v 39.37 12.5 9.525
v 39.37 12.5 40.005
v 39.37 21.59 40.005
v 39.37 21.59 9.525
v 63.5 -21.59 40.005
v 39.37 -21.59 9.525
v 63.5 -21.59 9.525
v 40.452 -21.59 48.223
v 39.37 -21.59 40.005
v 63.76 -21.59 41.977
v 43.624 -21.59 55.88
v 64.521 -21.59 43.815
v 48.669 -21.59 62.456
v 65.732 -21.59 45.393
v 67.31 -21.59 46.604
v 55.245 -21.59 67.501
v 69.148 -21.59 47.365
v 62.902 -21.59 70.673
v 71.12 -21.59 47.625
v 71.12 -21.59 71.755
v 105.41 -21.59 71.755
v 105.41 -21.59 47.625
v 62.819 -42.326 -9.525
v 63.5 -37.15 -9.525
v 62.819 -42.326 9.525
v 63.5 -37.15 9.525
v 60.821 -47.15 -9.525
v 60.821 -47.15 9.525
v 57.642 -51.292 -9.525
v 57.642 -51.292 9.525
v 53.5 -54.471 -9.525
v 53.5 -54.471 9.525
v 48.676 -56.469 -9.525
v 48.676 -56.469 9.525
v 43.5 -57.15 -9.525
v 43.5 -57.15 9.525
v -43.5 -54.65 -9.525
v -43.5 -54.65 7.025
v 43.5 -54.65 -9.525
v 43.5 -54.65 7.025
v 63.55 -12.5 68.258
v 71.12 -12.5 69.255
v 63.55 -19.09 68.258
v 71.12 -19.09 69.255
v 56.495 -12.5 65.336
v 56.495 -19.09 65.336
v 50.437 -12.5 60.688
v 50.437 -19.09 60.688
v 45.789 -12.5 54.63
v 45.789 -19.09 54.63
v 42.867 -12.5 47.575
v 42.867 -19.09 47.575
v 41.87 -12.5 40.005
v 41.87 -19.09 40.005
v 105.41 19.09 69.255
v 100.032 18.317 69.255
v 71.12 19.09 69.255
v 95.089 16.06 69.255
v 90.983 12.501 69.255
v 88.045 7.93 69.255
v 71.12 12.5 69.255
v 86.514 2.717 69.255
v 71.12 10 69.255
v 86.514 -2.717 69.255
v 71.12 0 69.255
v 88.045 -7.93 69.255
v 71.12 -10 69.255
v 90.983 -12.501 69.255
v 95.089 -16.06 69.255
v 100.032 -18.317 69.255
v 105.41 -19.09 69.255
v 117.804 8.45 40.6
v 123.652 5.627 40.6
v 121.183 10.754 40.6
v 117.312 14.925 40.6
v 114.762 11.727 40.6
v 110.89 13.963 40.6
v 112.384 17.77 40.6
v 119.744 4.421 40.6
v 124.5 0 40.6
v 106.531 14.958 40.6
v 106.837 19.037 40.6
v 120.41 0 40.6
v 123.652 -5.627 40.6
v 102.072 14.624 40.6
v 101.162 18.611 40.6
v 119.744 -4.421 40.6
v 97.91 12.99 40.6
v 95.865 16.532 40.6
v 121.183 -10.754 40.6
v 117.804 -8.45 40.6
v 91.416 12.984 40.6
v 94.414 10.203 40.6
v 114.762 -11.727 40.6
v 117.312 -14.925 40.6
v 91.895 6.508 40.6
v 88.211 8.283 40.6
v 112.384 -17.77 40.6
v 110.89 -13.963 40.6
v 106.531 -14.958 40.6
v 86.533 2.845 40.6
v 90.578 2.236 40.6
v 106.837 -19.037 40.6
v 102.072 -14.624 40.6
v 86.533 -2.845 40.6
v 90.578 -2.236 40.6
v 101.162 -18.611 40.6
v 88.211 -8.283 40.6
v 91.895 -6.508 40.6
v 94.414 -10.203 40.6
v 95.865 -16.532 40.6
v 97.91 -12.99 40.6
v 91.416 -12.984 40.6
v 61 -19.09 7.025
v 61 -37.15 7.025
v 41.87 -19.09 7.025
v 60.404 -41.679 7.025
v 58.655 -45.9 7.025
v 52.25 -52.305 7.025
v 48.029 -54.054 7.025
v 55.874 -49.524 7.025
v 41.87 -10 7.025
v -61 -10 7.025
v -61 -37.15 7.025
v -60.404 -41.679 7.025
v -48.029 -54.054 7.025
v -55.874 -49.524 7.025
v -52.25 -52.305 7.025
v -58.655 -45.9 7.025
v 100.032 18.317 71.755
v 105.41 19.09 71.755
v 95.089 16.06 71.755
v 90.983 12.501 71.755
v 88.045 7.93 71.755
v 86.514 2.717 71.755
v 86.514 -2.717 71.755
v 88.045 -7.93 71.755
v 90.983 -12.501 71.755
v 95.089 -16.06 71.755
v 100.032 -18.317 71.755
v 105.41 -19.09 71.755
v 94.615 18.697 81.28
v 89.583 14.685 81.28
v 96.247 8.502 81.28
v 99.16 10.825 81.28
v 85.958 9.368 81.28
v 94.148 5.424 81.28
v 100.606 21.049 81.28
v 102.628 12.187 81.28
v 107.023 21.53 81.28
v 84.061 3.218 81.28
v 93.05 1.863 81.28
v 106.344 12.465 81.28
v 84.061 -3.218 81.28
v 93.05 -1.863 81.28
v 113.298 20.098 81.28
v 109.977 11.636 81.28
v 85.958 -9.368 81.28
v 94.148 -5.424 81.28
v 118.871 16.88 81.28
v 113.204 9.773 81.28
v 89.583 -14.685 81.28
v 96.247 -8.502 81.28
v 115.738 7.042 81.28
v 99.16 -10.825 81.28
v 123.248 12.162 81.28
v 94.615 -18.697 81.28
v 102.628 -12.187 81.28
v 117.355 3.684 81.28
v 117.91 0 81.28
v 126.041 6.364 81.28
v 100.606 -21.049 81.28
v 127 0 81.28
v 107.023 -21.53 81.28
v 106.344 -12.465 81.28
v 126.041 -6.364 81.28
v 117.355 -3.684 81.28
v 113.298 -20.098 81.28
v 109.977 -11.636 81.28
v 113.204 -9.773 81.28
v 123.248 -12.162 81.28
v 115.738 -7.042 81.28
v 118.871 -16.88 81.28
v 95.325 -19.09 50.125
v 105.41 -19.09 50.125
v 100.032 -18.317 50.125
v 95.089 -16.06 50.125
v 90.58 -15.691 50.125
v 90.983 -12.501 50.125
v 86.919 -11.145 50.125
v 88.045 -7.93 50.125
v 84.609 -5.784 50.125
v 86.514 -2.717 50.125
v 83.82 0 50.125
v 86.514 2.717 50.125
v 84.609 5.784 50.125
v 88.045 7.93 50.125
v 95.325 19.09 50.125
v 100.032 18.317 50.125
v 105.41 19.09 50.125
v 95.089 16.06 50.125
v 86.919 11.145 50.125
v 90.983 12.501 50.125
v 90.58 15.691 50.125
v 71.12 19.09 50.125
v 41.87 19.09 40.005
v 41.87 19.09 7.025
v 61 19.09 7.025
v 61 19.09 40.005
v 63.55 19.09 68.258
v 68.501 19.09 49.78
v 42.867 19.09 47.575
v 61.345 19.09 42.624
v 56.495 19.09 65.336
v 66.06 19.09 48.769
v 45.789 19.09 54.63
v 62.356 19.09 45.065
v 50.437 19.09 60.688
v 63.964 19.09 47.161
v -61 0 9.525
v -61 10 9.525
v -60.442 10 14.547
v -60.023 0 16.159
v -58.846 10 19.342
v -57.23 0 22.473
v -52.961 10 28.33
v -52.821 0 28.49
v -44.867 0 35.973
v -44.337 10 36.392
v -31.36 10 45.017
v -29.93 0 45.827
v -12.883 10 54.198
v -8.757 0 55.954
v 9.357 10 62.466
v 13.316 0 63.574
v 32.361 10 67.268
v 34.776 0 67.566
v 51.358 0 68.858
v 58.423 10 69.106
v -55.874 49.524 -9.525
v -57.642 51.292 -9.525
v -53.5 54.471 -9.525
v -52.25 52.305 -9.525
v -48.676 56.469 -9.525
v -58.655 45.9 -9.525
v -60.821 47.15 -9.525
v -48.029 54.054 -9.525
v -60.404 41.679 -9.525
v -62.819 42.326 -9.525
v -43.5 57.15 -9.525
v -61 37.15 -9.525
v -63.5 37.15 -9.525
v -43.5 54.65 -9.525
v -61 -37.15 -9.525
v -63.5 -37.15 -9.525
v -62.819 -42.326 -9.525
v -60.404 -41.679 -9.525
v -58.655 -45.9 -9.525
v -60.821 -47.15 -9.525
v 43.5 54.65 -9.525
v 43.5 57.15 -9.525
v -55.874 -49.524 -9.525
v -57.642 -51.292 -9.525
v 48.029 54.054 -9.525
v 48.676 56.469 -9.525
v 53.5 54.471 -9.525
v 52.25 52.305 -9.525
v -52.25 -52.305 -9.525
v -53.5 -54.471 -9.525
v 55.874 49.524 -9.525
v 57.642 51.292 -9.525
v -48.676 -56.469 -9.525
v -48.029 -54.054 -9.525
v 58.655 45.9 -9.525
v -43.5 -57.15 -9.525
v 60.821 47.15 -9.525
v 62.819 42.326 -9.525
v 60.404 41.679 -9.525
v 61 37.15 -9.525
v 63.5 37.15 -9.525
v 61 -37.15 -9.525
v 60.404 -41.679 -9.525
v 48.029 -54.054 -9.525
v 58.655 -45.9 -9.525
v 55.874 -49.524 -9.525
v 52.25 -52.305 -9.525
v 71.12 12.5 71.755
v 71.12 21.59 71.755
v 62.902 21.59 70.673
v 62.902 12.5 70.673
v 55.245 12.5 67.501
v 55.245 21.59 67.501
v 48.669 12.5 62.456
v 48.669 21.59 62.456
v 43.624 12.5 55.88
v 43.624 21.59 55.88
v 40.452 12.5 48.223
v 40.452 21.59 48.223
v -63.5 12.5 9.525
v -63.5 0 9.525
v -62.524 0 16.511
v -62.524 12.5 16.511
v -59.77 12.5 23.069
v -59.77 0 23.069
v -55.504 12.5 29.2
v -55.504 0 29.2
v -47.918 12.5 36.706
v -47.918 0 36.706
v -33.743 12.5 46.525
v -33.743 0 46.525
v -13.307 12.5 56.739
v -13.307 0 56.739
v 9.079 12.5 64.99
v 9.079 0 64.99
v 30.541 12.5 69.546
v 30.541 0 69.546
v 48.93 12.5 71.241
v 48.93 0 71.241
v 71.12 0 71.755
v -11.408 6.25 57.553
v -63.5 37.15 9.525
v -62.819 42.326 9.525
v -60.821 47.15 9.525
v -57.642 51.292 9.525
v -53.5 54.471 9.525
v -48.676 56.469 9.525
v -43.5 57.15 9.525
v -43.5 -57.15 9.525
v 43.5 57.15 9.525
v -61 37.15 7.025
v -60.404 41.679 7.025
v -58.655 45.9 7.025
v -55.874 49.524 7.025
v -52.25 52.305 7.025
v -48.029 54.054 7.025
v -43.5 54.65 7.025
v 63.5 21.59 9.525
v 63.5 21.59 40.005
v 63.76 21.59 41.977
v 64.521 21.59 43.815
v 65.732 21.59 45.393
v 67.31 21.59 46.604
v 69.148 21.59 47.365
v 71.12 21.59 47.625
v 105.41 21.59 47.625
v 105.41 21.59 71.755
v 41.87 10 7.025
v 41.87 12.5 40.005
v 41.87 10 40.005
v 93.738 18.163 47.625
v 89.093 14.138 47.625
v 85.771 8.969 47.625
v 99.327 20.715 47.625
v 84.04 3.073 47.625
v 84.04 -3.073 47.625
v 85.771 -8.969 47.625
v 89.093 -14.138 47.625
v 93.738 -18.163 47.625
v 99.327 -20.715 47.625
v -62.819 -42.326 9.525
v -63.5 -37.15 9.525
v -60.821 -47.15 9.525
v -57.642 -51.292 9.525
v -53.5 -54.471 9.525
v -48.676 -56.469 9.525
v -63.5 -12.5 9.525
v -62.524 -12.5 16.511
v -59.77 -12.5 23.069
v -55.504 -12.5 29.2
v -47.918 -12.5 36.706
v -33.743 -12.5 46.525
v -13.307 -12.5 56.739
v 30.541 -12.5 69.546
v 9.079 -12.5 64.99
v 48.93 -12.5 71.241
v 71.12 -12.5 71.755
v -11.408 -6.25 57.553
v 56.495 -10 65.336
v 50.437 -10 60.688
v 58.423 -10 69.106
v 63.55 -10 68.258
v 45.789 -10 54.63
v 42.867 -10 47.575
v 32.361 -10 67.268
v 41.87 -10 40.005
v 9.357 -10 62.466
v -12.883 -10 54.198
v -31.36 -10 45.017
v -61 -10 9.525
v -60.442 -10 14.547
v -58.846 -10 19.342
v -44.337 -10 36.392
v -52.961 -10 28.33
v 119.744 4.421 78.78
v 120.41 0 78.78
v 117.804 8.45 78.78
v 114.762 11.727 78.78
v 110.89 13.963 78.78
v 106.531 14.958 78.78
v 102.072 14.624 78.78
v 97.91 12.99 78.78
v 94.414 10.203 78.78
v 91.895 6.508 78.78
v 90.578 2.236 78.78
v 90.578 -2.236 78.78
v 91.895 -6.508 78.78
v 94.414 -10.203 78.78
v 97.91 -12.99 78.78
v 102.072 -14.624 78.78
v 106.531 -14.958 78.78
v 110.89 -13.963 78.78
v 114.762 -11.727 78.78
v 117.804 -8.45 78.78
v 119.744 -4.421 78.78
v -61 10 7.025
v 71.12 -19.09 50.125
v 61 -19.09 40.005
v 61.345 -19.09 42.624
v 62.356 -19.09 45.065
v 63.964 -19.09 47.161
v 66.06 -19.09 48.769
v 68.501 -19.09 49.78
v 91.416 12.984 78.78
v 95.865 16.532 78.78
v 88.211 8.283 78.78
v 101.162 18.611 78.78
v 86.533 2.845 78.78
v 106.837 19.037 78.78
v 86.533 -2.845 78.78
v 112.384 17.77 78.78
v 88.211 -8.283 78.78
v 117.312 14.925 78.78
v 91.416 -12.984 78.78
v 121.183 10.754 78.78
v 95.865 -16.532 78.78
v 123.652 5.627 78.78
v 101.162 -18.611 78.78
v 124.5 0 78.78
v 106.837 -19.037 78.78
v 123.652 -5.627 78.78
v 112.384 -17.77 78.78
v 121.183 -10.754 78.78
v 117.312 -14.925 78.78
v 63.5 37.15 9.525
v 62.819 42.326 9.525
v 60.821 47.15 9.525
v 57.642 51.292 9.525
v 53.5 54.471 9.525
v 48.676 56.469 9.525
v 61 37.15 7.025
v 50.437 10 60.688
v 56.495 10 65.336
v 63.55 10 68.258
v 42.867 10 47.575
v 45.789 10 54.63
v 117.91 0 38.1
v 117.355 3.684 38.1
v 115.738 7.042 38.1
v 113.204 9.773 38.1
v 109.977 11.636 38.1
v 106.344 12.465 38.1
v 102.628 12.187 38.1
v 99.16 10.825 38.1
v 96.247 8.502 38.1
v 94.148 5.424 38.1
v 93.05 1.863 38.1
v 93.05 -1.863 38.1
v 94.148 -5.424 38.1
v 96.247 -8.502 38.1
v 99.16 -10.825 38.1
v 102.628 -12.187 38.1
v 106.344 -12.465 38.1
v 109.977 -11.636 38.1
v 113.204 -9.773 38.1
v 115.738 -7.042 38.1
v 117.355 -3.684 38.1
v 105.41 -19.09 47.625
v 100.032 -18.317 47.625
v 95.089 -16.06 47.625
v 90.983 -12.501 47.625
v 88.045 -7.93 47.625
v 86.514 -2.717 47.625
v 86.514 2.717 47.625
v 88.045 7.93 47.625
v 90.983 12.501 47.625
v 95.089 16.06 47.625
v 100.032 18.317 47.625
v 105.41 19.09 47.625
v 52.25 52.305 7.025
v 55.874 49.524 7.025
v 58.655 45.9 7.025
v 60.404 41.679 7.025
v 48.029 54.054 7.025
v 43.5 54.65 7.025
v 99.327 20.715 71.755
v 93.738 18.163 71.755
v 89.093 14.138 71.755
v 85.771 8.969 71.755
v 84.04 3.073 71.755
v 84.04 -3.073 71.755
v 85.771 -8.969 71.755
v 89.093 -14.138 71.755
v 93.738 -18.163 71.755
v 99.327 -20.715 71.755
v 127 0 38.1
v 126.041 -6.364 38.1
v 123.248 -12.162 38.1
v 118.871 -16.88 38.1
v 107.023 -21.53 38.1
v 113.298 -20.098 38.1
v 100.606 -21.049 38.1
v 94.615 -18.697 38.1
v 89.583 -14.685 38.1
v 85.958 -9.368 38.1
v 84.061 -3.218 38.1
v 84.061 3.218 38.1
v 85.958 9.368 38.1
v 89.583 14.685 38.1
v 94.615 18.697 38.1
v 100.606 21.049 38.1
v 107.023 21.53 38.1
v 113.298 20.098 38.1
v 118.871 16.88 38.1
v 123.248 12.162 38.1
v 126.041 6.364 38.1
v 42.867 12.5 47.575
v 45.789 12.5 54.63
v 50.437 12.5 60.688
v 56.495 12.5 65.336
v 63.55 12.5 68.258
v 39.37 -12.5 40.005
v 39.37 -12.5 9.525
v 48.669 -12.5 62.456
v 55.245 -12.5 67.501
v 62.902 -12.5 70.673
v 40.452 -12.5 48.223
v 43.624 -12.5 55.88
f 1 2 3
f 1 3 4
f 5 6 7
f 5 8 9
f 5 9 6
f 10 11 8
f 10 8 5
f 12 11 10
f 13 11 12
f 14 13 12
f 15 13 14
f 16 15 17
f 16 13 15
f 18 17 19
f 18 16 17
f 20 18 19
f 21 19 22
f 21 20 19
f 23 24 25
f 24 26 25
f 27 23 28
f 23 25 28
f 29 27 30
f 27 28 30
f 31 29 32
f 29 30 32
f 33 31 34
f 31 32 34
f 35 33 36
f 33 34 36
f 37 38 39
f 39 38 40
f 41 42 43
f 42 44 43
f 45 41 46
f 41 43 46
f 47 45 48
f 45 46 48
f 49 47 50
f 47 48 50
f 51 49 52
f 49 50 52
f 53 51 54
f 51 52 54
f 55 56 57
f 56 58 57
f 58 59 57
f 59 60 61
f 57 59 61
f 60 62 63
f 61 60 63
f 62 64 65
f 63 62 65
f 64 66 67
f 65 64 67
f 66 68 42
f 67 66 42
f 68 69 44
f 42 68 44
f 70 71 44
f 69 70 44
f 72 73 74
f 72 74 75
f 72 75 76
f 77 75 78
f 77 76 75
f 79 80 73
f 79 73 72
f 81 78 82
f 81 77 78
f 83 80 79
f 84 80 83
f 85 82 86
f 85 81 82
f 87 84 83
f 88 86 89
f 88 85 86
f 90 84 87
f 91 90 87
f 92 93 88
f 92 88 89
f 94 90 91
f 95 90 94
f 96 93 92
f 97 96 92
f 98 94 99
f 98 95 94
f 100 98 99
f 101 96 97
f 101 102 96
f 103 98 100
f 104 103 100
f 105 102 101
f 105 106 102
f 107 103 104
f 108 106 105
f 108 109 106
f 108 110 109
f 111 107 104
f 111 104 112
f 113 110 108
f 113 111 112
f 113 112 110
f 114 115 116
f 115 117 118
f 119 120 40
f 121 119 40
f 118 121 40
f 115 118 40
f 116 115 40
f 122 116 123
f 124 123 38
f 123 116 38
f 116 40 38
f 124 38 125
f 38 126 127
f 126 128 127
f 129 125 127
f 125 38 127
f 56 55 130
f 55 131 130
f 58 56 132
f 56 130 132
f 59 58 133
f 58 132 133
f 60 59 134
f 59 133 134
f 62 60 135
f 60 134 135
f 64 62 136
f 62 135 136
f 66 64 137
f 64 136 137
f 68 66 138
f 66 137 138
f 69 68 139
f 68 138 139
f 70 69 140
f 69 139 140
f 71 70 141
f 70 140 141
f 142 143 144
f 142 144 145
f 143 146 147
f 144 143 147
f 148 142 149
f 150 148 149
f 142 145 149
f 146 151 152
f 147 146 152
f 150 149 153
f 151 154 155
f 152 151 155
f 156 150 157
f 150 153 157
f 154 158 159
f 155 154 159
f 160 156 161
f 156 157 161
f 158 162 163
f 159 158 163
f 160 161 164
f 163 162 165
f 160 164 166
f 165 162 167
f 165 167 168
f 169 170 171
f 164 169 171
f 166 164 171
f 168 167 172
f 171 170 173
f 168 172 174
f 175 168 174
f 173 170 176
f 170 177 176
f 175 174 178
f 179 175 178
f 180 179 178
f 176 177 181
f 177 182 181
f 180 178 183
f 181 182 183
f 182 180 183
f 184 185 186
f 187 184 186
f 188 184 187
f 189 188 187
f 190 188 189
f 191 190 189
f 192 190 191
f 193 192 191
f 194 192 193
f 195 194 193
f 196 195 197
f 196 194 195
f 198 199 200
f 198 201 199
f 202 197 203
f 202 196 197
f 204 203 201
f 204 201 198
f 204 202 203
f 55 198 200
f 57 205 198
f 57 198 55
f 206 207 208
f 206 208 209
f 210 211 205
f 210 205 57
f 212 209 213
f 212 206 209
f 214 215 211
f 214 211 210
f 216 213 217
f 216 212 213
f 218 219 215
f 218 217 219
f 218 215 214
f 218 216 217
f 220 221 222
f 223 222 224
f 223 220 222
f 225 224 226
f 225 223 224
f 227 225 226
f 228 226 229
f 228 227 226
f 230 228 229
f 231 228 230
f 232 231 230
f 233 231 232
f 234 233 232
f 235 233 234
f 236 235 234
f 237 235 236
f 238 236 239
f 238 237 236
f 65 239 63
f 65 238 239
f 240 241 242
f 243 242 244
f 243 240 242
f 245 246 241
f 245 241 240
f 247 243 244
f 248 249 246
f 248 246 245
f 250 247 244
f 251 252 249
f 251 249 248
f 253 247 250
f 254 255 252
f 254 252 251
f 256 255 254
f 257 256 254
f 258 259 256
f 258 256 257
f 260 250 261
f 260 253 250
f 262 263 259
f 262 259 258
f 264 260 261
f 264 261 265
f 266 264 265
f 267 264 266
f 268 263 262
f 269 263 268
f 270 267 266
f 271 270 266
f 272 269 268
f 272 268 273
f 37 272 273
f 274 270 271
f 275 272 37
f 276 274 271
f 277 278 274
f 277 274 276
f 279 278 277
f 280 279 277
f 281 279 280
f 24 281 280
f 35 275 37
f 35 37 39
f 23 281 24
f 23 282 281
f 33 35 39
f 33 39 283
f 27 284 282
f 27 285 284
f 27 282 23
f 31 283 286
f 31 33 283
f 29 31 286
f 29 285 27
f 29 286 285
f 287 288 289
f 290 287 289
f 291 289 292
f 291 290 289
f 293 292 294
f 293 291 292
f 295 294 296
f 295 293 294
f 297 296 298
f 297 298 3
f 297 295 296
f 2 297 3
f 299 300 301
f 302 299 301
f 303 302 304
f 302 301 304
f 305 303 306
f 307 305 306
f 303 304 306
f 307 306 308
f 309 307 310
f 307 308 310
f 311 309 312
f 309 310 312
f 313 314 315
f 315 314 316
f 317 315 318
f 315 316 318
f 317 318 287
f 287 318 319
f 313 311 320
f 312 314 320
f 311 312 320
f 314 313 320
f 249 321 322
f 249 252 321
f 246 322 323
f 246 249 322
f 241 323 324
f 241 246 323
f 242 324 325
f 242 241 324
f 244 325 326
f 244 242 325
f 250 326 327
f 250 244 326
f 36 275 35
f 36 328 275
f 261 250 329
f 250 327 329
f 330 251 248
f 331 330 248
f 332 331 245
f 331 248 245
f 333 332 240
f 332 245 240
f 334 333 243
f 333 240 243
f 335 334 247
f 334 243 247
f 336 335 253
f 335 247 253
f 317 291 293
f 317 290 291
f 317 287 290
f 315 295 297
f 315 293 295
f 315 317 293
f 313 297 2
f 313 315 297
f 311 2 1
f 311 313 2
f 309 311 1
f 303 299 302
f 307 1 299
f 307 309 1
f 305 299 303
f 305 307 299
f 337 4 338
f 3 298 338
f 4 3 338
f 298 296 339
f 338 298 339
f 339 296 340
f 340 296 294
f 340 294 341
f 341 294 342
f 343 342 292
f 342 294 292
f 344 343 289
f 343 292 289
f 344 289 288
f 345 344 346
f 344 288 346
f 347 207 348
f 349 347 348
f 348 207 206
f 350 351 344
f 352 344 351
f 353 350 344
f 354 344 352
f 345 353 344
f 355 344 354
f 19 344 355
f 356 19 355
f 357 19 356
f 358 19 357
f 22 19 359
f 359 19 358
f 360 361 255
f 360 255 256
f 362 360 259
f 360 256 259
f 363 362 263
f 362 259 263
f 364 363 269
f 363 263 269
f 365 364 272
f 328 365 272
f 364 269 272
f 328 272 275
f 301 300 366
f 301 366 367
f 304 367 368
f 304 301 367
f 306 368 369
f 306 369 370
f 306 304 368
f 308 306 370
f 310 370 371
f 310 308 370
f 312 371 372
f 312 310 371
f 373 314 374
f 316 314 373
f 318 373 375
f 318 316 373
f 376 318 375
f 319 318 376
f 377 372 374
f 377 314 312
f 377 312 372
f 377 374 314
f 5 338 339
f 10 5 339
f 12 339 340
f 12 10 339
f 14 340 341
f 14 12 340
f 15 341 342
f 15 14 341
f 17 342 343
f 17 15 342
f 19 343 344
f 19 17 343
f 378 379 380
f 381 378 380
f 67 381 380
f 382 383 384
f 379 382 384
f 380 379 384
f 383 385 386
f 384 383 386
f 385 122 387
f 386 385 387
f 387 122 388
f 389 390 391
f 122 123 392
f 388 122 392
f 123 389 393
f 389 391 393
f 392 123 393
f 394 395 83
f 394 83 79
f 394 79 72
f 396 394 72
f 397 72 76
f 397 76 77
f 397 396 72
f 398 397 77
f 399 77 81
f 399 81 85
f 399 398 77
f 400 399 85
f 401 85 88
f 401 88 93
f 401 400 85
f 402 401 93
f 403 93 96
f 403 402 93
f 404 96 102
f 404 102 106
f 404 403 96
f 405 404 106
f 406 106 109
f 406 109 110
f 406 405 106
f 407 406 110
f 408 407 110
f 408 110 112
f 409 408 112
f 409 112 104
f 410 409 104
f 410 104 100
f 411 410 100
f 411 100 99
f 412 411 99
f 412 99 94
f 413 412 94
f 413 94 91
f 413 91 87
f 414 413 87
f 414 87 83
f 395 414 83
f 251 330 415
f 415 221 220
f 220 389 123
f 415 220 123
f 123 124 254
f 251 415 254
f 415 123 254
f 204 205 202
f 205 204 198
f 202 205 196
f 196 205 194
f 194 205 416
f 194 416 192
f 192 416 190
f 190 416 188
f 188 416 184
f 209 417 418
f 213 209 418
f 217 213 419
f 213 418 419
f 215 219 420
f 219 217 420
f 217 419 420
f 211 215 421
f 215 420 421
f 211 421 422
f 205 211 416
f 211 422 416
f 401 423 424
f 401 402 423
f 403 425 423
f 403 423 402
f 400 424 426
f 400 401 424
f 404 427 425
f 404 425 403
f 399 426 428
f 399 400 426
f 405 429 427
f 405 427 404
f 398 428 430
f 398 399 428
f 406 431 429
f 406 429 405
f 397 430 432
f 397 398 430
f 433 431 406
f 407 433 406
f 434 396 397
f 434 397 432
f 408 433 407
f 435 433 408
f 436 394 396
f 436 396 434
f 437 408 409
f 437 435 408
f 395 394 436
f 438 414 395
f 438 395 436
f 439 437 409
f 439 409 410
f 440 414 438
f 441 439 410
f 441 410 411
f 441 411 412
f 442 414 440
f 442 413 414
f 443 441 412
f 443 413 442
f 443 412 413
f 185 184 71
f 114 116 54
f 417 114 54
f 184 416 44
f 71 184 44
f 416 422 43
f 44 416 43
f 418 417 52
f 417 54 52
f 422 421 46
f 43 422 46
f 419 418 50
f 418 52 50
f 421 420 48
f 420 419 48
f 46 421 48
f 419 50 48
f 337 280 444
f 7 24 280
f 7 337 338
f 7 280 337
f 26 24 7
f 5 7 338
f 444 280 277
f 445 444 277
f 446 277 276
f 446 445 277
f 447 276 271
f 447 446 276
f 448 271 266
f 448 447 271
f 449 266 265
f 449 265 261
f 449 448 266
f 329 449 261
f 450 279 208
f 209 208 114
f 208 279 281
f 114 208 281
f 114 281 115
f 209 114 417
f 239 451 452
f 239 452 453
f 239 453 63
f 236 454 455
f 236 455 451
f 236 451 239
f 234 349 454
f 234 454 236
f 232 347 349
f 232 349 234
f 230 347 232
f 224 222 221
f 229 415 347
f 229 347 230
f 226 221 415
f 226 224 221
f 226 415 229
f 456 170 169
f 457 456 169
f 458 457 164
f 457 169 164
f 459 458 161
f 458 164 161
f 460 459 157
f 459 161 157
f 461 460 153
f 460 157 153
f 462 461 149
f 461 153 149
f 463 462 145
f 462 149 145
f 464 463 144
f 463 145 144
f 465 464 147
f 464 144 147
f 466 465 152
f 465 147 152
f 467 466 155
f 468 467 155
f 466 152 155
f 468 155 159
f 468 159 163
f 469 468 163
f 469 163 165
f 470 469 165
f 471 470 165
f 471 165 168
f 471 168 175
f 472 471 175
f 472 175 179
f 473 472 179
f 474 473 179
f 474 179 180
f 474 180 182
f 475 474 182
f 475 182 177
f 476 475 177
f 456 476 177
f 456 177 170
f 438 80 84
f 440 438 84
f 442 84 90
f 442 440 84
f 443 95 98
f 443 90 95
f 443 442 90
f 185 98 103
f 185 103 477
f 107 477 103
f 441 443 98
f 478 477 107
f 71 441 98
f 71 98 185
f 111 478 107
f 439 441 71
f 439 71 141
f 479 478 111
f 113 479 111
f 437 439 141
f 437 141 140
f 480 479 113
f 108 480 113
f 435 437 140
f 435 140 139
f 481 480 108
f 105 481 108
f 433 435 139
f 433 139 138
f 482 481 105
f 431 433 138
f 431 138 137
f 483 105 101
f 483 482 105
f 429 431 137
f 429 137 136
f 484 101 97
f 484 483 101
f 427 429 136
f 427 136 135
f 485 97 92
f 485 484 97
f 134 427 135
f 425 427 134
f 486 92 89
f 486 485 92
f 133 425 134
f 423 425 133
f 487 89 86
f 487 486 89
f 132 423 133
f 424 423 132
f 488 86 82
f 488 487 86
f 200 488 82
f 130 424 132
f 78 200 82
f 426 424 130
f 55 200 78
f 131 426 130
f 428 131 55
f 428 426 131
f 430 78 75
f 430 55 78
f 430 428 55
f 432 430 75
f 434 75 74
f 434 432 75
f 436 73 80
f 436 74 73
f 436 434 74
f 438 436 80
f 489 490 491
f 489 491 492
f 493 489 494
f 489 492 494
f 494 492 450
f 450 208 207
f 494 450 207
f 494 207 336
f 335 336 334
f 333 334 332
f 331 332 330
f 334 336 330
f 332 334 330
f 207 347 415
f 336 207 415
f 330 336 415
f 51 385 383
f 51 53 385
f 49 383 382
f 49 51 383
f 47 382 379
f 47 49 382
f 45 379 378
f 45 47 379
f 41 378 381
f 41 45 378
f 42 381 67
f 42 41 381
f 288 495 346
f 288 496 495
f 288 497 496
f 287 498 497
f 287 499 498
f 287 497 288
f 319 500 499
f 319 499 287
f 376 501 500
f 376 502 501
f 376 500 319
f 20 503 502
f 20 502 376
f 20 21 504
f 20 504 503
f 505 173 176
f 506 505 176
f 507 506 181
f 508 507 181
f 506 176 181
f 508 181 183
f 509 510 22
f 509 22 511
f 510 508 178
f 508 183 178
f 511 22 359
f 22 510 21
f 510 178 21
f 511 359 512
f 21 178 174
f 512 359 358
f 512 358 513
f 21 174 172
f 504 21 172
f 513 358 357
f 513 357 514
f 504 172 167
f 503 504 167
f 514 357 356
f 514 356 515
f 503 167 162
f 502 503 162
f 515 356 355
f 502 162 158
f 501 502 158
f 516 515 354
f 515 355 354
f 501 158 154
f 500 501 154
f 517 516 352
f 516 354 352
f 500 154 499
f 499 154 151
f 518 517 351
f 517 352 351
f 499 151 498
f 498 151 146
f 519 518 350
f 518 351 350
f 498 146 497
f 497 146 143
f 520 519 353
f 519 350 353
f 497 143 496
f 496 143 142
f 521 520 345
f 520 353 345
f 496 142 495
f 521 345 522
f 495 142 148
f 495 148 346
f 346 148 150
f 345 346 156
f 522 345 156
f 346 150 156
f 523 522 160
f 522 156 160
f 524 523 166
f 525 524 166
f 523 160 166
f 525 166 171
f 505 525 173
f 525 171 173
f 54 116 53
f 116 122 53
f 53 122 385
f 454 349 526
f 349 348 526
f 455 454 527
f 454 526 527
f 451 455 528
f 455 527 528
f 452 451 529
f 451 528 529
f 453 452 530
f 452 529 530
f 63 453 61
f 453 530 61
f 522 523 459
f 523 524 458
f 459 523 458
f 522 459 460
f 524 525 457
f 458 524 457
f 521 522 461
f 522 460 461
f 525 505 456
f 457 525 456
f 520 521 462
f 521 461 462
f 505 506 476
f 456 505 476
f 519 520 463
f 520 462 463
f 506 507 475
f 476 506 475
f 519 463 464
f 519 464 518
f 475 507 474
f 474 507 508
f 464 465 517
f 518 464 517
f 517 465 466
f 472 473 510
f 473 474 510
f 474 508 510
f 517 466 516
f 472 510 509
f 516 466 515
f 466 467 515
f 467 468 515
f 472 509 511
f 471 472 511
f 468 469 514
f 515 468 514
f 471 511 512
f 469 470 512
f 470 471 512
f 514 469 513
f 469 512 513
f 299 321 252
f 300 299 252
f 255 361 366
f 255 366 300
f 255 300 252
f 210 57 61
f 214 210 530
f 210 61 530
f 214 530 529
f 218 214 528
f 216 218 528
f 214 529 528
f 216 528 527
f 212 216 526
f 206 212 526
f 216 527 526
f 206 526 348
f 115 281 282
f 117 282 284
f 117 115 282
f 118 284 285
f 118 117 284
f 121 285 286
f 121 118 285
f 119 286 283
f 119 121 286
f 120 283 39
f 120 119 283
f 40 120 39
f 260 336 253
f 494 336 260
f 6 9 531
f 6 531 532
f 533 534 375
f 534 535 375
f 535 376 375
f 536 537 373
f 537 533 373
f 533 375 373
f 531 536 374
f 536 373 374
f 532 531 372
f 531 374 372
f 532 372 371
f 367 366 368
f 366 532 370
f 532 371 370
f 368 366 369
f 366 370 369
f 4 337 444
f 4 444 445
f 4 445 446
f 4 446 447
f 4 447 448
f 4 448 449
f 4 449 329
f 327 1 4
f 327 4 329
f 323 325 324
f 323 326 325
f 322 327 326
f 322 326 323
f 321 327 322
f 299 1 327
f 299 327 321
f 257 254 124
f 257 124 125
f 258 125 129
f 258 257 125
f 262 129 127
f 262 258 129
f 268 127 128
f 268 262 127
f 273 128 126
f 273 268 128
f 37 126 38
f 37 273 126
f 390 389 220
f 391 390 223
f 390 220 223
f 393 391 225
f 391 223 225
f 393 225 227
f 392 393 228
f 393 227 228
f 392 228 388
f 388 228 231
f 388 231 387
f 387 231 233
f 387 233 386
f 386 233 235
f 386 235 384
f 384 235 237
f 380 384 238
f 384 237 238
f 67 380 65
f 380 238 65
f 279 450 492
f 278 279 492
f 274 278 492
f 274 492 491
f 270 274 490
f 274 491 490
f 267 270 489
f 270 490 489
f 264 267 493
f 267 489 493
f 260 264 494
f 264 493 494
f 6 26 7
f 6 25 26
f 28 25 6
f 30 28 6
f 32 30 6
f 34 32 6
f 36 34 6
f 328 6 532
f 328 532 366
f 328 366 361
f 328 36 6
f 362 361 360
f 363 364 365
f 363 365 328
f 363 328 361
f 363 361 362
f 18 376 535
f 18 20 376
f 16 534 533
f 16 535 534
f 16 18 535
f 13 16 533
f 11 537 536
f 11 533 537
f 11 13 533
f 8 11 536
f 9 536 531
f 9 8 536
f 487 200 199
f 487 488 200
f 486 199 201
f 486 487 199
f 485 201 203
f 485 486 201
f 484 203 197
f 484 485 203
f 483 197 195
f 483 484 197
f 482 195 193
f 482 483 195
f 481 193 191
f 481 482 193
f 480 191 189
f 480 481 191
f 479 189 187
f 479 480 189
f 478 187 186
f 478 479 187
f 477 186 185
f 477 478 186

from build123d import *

# Parameters (mm, degrees)
F1_DEPTH     = 57.15
F0_W         = 21.59
F0_H         = 24.13
F2_DEPTH     = 21.59
F3_DEPTH     = 12.5
F5_R         = 12.5
F6_DEPTH     = 90.806
F7_R         = 20
F8_T         = 2.5
F8_T3_DEPTH  = 107.87
F8_T5_DEPTH  = 14.09
F8_T7_DEPTH  = 29.13
F8_T9_DEPTH  = 14.09
F8_T11_DEPTH = 35.48
F8_T14_ANGLE = 90.000000001
F8_T16_ANGLE = 90.000000001
F8_T18_ANGLE = 180.000000001
F8_T20_ANGLE = 180.000000001


# Not quite as in the source:
# - a shell that OpenCascade refuses in one call is made with other operations: the cavity is built on its own and cut out


with BuildPart() as f1:
    # F0 (on Front) → F1 (new body, symmetric)
    with BuildSketch(Plane.XZ):
        Polygon((-63.5, -9.525), (63.5, -9.525), (63.5, 9.525), (39.37, 9.525), (-63.5, 9.525), align=None)
    extrude(amount=F1_DEPTH, both=True)

    # F0 (on Front) → F2 (join, symmetric)
    with BuildSketch(Plane.XZ):
        with BuildLine():
            Line((39.37, 9.525), (63.5, 9.525))
            Line((63.5, 9.525), (63.5, 40.005))
            ThreePointArc((63.5, 40.005), (65.7318463274, 45.3931536726), (71.12, 47.625))
            Line((71.12, 47.625), (83.82, 47.625))
            Line((83.82, 47.625), (83.82, 71.755))
            Line((83.82, 71.755), (71.12, 71.755))
            ThreePointArc((71.12, 71.755), (48.6693596973, 62.4556403027), (39.37, 40.005))
            Line((39.37, 40.005), (39.37, 9.525))
        make_face()
        with Locations((94.615, 59.69)):
            Rectangle(F0_W, F0_H)
    extrude(amount=F2_DEPTH, both=True)

    # F0 (on Front) → F3 (join, symmetric)
    with BuildSketch(Plane.XZ):
        with BuildLine():
            add(Edge.make_bspline(
                [(-63.5, 9.525), (-63.5, 31.5907289062), (-3.4680848518, 65.1337229979), (32.8965573805, 71.755), (71.12, 71.755)],
                knots=[0, 0, 0, 0, 0.4791248693, 1, 1, 1, 1], degree=3))
            Line((-63.5, 9.525), (39.37, 9.525))
            Line((39.37, 9.525), (39.37, 40.005))
            ThreePointArc((39.37, 40.005), (48.6693596973, 62.4556403027), (71.12, 71.755))
        make_face()
    extrude(amount=F3_DEPTH, both=True)

    # F0 (on Front) → F4 (revolve)
    with BuildSketch(Plane.XZ):
        Polygon((105.41, 81.28), (105.41, 71.755), (105.41, 47.625), (105.41, 38.1), (127, 38.1), (127, 81.28), align=None)
    revolve(axis=Axis((105.41, 0, 59.69), (0, 0, -1)))

    # F5 (on face) → F6 (cut, through all)
    with BuildSketch(Plane.XY.offset(81.28)):
        with Locations((105.41, 0)):
            Circle(F5_R)
    extrude(amount=-F6_DEPTH, mode=Mode.SUBTRACT)

    # F7
    f7_edges = [f1.edges().sort_by_distance(p)[0] for p in [
        (63.5, -57.15, 0),
        (-63.5, -57.15, 0),
        (63.5, 57.15, 0),
        (-63.5, 57.15, 0),
    ]]
    fillet(f7_edges, radius=F7_R)

    # F8: shell of thickness 2.5, made by hand


with BuildPart() as f8_core1:
    # F8_t2: copy of F1
    add(f1.part)

    # the walls: a layer under each face that stays
    f8_faces = [f8_core1.faces().sort_by_distance(p)[0] for p in [
        (0, 57.15, 0),
        (-57.6421356237, 51.2921356237, 0),
        (57.6421356237, 51.2921356237, 0),
        (-63.5, 0, 0),
        (63.5, 0, 15.24),
        (-57.6421356237, -51.2921356237, 0),
        (57.6421356237, -51.2921356237, 0),
        (0, -57.15, 0),
        (0, 34.825, 9.525),
        (0, -34.825, 9.525),
        (-8.3874166975, -6.25, 58.8110273922),
        (-8.3874166975, 6.25, 58.8110273922),
        (50.3766666667, 21.59, 19.8966666667),
        (50.3766666667, -21.59, 19.8966666667),
        (65.7318463274, 0, 45.3931536726),
        (3.81, 12.5, 40.64),
        (39.37, 17.045, 24.765),
        (3.81, -12.5, 40.64),
        (39.37, -17.045, 24.765),
        (88.265, 14.3933333333, 71.755),
        (76.835, 14.3933333333, 47.625),
        (116.205, -18.6974884677, 45.2966666667),
        (48.6693596973, 17.045, 62.4556403027),
        (48.6693596973, -17.045, 62.4556403027),
        (91.0166666667, 14.3933333333, 81.28),
        (119.8033333333, 14.3933333333, 38.1),
        (92.91, 0, 59.69),
    ]]
    thicken(f8_faces, amount=-F8_T, mode=Mode.SUBTRACT)

    # F8_s4 → F8_t3 (cut)
    with BuildSketch(Plane.YZ.offset(-66)):
        Polygon((12.525, 9.55), (12.5, 7.025), (10, 7.025), (10, 9.525), align=None)
        Polygon((-12.525, 9.55), (-12.5, 7.025), (-10, 7.025), (-10, 9.525), align=None)
    extrude(amount=F8_T3_DEPTH, mode=Mode.SUBTRACT)

    # F8_s6 → F8_t5 (cut)
    with BuildSketch(Plane.XZ.offset(-24.09)):
        Polygon((39.345, 9.55), (39.37, 7.025), (41.87, 7.025), (41.87, 9.525), align=None)
    extrude(amount=F8_T5_DEPTH, mode=Mode.SUBTRACT)

    # F8_s8 → F8_t7 (cut)
    with BuildSketch(Plane.YZ.offset(36.87)):
        Polygon((21.615, 9.55), (21.59, 7.025), (19.09, 7.025), (19.09, 9.525), align=None)
        Polygon((-21.615, 9.55), (-21.59, 7.025), (-19.09, 7.025), (-19.09, 9.525), align=None)
    extrude(amount=F8_T7_DEPTH, mode=Mode.SUBTRACT)

    # F8_s10 → F8_t9 (cut)
    with BuildSketch(Plane.XZ.offset(10)):
        Polygon((39.345, 9.55), (39.37, 7.025), (41.87, 7.025), (41.87, 9.525), align=None)
    extrude(amount=F8_T9_DEPTH, mode=Mode.SUBTRACT)

    # F8_s12 → F8_t11 (cut)
    with BuildSketch(Plane.XY.offset(7.025)):
        Polygon((39.345, 12.525), (39.37, 10), (41.87, 10), (41.87, 12.5), align=None)
        Polygon((39.345, -12.525), (39.37, -10), (41.87, -10), (41.87, -12.5), align=None)
    extrude(amount=F8_T11_DEPTH, mode=Mode.SUBTRACT)

    # F8_s13 → F8_t14 (revolve, cut)
    with BuildSketch(Plane.XY.offset(40.005)):
        Polygon((39.345, 12.525), (39.37, 10), (41.87, 10), (41.87, 12.5), align=None)
    revolve(axis=Axis((71.12, 12.5, 40.005), (0, 1, 0)), revolution_arc=F8_T14_ANGLE, mode=Mode.SUBTRACT)

    # F8_s15 → F8_t16 (revolve, cut)
    with BuildSketch(Plane.XY.offset(40.005)):
        Polygon((39.345, -12.525), (39.37, -10), (41.87, -10), (41.87, -12.5), align=None)
    revolve(axis=Axis((71.12, -12.5, 40.005), (0, 1, 0)), revolution_arc=F8_T16_ANGLE, mode=Mode.SUBTRACT)

    # F8_s17 → F8_t18 (revolve, cut)
    with BuildSketch(Plane.YZ.offset(105.41)):
        Polygon((21.615, 71.78), (21.59, 69.255), (19.09, 69.255), (19.09, 71.755), align=None)
    revolve(axis=Axis((105.41, 0, 71.755), (0, 0, 1)), revolution_arc=F8_T18_ANGLE, mode=Mode.SUBTRACT)

    # F8_s19 → F8_t20 (revolve, cut)
    with BuildSketch(Plane.YZ.offset(105.41)):
        Polygon((21.615, 47.6), (21.59, 50.125), (19.09, 50.125), (19.09, 47.625), align=None)
    revolve(axis=Axis((105.41, 0, 47.625), (0, 0, 1)), revolution_arc=F8_T20_ANGLE, mode=Mode.SUBTRACT)


with BuildPart() as f1_1:
    add(f1.part)

    # what is left inside the walls is the cavity
    f8_cavity = [f8_core1.part.solids().sort_by_distance(p)[0] for p in [
        (0, 18.216667, -9.5),
    ]]
    add(f8_cavity, mode=Mode.SUBTRACT)


solid = f1_1.part
